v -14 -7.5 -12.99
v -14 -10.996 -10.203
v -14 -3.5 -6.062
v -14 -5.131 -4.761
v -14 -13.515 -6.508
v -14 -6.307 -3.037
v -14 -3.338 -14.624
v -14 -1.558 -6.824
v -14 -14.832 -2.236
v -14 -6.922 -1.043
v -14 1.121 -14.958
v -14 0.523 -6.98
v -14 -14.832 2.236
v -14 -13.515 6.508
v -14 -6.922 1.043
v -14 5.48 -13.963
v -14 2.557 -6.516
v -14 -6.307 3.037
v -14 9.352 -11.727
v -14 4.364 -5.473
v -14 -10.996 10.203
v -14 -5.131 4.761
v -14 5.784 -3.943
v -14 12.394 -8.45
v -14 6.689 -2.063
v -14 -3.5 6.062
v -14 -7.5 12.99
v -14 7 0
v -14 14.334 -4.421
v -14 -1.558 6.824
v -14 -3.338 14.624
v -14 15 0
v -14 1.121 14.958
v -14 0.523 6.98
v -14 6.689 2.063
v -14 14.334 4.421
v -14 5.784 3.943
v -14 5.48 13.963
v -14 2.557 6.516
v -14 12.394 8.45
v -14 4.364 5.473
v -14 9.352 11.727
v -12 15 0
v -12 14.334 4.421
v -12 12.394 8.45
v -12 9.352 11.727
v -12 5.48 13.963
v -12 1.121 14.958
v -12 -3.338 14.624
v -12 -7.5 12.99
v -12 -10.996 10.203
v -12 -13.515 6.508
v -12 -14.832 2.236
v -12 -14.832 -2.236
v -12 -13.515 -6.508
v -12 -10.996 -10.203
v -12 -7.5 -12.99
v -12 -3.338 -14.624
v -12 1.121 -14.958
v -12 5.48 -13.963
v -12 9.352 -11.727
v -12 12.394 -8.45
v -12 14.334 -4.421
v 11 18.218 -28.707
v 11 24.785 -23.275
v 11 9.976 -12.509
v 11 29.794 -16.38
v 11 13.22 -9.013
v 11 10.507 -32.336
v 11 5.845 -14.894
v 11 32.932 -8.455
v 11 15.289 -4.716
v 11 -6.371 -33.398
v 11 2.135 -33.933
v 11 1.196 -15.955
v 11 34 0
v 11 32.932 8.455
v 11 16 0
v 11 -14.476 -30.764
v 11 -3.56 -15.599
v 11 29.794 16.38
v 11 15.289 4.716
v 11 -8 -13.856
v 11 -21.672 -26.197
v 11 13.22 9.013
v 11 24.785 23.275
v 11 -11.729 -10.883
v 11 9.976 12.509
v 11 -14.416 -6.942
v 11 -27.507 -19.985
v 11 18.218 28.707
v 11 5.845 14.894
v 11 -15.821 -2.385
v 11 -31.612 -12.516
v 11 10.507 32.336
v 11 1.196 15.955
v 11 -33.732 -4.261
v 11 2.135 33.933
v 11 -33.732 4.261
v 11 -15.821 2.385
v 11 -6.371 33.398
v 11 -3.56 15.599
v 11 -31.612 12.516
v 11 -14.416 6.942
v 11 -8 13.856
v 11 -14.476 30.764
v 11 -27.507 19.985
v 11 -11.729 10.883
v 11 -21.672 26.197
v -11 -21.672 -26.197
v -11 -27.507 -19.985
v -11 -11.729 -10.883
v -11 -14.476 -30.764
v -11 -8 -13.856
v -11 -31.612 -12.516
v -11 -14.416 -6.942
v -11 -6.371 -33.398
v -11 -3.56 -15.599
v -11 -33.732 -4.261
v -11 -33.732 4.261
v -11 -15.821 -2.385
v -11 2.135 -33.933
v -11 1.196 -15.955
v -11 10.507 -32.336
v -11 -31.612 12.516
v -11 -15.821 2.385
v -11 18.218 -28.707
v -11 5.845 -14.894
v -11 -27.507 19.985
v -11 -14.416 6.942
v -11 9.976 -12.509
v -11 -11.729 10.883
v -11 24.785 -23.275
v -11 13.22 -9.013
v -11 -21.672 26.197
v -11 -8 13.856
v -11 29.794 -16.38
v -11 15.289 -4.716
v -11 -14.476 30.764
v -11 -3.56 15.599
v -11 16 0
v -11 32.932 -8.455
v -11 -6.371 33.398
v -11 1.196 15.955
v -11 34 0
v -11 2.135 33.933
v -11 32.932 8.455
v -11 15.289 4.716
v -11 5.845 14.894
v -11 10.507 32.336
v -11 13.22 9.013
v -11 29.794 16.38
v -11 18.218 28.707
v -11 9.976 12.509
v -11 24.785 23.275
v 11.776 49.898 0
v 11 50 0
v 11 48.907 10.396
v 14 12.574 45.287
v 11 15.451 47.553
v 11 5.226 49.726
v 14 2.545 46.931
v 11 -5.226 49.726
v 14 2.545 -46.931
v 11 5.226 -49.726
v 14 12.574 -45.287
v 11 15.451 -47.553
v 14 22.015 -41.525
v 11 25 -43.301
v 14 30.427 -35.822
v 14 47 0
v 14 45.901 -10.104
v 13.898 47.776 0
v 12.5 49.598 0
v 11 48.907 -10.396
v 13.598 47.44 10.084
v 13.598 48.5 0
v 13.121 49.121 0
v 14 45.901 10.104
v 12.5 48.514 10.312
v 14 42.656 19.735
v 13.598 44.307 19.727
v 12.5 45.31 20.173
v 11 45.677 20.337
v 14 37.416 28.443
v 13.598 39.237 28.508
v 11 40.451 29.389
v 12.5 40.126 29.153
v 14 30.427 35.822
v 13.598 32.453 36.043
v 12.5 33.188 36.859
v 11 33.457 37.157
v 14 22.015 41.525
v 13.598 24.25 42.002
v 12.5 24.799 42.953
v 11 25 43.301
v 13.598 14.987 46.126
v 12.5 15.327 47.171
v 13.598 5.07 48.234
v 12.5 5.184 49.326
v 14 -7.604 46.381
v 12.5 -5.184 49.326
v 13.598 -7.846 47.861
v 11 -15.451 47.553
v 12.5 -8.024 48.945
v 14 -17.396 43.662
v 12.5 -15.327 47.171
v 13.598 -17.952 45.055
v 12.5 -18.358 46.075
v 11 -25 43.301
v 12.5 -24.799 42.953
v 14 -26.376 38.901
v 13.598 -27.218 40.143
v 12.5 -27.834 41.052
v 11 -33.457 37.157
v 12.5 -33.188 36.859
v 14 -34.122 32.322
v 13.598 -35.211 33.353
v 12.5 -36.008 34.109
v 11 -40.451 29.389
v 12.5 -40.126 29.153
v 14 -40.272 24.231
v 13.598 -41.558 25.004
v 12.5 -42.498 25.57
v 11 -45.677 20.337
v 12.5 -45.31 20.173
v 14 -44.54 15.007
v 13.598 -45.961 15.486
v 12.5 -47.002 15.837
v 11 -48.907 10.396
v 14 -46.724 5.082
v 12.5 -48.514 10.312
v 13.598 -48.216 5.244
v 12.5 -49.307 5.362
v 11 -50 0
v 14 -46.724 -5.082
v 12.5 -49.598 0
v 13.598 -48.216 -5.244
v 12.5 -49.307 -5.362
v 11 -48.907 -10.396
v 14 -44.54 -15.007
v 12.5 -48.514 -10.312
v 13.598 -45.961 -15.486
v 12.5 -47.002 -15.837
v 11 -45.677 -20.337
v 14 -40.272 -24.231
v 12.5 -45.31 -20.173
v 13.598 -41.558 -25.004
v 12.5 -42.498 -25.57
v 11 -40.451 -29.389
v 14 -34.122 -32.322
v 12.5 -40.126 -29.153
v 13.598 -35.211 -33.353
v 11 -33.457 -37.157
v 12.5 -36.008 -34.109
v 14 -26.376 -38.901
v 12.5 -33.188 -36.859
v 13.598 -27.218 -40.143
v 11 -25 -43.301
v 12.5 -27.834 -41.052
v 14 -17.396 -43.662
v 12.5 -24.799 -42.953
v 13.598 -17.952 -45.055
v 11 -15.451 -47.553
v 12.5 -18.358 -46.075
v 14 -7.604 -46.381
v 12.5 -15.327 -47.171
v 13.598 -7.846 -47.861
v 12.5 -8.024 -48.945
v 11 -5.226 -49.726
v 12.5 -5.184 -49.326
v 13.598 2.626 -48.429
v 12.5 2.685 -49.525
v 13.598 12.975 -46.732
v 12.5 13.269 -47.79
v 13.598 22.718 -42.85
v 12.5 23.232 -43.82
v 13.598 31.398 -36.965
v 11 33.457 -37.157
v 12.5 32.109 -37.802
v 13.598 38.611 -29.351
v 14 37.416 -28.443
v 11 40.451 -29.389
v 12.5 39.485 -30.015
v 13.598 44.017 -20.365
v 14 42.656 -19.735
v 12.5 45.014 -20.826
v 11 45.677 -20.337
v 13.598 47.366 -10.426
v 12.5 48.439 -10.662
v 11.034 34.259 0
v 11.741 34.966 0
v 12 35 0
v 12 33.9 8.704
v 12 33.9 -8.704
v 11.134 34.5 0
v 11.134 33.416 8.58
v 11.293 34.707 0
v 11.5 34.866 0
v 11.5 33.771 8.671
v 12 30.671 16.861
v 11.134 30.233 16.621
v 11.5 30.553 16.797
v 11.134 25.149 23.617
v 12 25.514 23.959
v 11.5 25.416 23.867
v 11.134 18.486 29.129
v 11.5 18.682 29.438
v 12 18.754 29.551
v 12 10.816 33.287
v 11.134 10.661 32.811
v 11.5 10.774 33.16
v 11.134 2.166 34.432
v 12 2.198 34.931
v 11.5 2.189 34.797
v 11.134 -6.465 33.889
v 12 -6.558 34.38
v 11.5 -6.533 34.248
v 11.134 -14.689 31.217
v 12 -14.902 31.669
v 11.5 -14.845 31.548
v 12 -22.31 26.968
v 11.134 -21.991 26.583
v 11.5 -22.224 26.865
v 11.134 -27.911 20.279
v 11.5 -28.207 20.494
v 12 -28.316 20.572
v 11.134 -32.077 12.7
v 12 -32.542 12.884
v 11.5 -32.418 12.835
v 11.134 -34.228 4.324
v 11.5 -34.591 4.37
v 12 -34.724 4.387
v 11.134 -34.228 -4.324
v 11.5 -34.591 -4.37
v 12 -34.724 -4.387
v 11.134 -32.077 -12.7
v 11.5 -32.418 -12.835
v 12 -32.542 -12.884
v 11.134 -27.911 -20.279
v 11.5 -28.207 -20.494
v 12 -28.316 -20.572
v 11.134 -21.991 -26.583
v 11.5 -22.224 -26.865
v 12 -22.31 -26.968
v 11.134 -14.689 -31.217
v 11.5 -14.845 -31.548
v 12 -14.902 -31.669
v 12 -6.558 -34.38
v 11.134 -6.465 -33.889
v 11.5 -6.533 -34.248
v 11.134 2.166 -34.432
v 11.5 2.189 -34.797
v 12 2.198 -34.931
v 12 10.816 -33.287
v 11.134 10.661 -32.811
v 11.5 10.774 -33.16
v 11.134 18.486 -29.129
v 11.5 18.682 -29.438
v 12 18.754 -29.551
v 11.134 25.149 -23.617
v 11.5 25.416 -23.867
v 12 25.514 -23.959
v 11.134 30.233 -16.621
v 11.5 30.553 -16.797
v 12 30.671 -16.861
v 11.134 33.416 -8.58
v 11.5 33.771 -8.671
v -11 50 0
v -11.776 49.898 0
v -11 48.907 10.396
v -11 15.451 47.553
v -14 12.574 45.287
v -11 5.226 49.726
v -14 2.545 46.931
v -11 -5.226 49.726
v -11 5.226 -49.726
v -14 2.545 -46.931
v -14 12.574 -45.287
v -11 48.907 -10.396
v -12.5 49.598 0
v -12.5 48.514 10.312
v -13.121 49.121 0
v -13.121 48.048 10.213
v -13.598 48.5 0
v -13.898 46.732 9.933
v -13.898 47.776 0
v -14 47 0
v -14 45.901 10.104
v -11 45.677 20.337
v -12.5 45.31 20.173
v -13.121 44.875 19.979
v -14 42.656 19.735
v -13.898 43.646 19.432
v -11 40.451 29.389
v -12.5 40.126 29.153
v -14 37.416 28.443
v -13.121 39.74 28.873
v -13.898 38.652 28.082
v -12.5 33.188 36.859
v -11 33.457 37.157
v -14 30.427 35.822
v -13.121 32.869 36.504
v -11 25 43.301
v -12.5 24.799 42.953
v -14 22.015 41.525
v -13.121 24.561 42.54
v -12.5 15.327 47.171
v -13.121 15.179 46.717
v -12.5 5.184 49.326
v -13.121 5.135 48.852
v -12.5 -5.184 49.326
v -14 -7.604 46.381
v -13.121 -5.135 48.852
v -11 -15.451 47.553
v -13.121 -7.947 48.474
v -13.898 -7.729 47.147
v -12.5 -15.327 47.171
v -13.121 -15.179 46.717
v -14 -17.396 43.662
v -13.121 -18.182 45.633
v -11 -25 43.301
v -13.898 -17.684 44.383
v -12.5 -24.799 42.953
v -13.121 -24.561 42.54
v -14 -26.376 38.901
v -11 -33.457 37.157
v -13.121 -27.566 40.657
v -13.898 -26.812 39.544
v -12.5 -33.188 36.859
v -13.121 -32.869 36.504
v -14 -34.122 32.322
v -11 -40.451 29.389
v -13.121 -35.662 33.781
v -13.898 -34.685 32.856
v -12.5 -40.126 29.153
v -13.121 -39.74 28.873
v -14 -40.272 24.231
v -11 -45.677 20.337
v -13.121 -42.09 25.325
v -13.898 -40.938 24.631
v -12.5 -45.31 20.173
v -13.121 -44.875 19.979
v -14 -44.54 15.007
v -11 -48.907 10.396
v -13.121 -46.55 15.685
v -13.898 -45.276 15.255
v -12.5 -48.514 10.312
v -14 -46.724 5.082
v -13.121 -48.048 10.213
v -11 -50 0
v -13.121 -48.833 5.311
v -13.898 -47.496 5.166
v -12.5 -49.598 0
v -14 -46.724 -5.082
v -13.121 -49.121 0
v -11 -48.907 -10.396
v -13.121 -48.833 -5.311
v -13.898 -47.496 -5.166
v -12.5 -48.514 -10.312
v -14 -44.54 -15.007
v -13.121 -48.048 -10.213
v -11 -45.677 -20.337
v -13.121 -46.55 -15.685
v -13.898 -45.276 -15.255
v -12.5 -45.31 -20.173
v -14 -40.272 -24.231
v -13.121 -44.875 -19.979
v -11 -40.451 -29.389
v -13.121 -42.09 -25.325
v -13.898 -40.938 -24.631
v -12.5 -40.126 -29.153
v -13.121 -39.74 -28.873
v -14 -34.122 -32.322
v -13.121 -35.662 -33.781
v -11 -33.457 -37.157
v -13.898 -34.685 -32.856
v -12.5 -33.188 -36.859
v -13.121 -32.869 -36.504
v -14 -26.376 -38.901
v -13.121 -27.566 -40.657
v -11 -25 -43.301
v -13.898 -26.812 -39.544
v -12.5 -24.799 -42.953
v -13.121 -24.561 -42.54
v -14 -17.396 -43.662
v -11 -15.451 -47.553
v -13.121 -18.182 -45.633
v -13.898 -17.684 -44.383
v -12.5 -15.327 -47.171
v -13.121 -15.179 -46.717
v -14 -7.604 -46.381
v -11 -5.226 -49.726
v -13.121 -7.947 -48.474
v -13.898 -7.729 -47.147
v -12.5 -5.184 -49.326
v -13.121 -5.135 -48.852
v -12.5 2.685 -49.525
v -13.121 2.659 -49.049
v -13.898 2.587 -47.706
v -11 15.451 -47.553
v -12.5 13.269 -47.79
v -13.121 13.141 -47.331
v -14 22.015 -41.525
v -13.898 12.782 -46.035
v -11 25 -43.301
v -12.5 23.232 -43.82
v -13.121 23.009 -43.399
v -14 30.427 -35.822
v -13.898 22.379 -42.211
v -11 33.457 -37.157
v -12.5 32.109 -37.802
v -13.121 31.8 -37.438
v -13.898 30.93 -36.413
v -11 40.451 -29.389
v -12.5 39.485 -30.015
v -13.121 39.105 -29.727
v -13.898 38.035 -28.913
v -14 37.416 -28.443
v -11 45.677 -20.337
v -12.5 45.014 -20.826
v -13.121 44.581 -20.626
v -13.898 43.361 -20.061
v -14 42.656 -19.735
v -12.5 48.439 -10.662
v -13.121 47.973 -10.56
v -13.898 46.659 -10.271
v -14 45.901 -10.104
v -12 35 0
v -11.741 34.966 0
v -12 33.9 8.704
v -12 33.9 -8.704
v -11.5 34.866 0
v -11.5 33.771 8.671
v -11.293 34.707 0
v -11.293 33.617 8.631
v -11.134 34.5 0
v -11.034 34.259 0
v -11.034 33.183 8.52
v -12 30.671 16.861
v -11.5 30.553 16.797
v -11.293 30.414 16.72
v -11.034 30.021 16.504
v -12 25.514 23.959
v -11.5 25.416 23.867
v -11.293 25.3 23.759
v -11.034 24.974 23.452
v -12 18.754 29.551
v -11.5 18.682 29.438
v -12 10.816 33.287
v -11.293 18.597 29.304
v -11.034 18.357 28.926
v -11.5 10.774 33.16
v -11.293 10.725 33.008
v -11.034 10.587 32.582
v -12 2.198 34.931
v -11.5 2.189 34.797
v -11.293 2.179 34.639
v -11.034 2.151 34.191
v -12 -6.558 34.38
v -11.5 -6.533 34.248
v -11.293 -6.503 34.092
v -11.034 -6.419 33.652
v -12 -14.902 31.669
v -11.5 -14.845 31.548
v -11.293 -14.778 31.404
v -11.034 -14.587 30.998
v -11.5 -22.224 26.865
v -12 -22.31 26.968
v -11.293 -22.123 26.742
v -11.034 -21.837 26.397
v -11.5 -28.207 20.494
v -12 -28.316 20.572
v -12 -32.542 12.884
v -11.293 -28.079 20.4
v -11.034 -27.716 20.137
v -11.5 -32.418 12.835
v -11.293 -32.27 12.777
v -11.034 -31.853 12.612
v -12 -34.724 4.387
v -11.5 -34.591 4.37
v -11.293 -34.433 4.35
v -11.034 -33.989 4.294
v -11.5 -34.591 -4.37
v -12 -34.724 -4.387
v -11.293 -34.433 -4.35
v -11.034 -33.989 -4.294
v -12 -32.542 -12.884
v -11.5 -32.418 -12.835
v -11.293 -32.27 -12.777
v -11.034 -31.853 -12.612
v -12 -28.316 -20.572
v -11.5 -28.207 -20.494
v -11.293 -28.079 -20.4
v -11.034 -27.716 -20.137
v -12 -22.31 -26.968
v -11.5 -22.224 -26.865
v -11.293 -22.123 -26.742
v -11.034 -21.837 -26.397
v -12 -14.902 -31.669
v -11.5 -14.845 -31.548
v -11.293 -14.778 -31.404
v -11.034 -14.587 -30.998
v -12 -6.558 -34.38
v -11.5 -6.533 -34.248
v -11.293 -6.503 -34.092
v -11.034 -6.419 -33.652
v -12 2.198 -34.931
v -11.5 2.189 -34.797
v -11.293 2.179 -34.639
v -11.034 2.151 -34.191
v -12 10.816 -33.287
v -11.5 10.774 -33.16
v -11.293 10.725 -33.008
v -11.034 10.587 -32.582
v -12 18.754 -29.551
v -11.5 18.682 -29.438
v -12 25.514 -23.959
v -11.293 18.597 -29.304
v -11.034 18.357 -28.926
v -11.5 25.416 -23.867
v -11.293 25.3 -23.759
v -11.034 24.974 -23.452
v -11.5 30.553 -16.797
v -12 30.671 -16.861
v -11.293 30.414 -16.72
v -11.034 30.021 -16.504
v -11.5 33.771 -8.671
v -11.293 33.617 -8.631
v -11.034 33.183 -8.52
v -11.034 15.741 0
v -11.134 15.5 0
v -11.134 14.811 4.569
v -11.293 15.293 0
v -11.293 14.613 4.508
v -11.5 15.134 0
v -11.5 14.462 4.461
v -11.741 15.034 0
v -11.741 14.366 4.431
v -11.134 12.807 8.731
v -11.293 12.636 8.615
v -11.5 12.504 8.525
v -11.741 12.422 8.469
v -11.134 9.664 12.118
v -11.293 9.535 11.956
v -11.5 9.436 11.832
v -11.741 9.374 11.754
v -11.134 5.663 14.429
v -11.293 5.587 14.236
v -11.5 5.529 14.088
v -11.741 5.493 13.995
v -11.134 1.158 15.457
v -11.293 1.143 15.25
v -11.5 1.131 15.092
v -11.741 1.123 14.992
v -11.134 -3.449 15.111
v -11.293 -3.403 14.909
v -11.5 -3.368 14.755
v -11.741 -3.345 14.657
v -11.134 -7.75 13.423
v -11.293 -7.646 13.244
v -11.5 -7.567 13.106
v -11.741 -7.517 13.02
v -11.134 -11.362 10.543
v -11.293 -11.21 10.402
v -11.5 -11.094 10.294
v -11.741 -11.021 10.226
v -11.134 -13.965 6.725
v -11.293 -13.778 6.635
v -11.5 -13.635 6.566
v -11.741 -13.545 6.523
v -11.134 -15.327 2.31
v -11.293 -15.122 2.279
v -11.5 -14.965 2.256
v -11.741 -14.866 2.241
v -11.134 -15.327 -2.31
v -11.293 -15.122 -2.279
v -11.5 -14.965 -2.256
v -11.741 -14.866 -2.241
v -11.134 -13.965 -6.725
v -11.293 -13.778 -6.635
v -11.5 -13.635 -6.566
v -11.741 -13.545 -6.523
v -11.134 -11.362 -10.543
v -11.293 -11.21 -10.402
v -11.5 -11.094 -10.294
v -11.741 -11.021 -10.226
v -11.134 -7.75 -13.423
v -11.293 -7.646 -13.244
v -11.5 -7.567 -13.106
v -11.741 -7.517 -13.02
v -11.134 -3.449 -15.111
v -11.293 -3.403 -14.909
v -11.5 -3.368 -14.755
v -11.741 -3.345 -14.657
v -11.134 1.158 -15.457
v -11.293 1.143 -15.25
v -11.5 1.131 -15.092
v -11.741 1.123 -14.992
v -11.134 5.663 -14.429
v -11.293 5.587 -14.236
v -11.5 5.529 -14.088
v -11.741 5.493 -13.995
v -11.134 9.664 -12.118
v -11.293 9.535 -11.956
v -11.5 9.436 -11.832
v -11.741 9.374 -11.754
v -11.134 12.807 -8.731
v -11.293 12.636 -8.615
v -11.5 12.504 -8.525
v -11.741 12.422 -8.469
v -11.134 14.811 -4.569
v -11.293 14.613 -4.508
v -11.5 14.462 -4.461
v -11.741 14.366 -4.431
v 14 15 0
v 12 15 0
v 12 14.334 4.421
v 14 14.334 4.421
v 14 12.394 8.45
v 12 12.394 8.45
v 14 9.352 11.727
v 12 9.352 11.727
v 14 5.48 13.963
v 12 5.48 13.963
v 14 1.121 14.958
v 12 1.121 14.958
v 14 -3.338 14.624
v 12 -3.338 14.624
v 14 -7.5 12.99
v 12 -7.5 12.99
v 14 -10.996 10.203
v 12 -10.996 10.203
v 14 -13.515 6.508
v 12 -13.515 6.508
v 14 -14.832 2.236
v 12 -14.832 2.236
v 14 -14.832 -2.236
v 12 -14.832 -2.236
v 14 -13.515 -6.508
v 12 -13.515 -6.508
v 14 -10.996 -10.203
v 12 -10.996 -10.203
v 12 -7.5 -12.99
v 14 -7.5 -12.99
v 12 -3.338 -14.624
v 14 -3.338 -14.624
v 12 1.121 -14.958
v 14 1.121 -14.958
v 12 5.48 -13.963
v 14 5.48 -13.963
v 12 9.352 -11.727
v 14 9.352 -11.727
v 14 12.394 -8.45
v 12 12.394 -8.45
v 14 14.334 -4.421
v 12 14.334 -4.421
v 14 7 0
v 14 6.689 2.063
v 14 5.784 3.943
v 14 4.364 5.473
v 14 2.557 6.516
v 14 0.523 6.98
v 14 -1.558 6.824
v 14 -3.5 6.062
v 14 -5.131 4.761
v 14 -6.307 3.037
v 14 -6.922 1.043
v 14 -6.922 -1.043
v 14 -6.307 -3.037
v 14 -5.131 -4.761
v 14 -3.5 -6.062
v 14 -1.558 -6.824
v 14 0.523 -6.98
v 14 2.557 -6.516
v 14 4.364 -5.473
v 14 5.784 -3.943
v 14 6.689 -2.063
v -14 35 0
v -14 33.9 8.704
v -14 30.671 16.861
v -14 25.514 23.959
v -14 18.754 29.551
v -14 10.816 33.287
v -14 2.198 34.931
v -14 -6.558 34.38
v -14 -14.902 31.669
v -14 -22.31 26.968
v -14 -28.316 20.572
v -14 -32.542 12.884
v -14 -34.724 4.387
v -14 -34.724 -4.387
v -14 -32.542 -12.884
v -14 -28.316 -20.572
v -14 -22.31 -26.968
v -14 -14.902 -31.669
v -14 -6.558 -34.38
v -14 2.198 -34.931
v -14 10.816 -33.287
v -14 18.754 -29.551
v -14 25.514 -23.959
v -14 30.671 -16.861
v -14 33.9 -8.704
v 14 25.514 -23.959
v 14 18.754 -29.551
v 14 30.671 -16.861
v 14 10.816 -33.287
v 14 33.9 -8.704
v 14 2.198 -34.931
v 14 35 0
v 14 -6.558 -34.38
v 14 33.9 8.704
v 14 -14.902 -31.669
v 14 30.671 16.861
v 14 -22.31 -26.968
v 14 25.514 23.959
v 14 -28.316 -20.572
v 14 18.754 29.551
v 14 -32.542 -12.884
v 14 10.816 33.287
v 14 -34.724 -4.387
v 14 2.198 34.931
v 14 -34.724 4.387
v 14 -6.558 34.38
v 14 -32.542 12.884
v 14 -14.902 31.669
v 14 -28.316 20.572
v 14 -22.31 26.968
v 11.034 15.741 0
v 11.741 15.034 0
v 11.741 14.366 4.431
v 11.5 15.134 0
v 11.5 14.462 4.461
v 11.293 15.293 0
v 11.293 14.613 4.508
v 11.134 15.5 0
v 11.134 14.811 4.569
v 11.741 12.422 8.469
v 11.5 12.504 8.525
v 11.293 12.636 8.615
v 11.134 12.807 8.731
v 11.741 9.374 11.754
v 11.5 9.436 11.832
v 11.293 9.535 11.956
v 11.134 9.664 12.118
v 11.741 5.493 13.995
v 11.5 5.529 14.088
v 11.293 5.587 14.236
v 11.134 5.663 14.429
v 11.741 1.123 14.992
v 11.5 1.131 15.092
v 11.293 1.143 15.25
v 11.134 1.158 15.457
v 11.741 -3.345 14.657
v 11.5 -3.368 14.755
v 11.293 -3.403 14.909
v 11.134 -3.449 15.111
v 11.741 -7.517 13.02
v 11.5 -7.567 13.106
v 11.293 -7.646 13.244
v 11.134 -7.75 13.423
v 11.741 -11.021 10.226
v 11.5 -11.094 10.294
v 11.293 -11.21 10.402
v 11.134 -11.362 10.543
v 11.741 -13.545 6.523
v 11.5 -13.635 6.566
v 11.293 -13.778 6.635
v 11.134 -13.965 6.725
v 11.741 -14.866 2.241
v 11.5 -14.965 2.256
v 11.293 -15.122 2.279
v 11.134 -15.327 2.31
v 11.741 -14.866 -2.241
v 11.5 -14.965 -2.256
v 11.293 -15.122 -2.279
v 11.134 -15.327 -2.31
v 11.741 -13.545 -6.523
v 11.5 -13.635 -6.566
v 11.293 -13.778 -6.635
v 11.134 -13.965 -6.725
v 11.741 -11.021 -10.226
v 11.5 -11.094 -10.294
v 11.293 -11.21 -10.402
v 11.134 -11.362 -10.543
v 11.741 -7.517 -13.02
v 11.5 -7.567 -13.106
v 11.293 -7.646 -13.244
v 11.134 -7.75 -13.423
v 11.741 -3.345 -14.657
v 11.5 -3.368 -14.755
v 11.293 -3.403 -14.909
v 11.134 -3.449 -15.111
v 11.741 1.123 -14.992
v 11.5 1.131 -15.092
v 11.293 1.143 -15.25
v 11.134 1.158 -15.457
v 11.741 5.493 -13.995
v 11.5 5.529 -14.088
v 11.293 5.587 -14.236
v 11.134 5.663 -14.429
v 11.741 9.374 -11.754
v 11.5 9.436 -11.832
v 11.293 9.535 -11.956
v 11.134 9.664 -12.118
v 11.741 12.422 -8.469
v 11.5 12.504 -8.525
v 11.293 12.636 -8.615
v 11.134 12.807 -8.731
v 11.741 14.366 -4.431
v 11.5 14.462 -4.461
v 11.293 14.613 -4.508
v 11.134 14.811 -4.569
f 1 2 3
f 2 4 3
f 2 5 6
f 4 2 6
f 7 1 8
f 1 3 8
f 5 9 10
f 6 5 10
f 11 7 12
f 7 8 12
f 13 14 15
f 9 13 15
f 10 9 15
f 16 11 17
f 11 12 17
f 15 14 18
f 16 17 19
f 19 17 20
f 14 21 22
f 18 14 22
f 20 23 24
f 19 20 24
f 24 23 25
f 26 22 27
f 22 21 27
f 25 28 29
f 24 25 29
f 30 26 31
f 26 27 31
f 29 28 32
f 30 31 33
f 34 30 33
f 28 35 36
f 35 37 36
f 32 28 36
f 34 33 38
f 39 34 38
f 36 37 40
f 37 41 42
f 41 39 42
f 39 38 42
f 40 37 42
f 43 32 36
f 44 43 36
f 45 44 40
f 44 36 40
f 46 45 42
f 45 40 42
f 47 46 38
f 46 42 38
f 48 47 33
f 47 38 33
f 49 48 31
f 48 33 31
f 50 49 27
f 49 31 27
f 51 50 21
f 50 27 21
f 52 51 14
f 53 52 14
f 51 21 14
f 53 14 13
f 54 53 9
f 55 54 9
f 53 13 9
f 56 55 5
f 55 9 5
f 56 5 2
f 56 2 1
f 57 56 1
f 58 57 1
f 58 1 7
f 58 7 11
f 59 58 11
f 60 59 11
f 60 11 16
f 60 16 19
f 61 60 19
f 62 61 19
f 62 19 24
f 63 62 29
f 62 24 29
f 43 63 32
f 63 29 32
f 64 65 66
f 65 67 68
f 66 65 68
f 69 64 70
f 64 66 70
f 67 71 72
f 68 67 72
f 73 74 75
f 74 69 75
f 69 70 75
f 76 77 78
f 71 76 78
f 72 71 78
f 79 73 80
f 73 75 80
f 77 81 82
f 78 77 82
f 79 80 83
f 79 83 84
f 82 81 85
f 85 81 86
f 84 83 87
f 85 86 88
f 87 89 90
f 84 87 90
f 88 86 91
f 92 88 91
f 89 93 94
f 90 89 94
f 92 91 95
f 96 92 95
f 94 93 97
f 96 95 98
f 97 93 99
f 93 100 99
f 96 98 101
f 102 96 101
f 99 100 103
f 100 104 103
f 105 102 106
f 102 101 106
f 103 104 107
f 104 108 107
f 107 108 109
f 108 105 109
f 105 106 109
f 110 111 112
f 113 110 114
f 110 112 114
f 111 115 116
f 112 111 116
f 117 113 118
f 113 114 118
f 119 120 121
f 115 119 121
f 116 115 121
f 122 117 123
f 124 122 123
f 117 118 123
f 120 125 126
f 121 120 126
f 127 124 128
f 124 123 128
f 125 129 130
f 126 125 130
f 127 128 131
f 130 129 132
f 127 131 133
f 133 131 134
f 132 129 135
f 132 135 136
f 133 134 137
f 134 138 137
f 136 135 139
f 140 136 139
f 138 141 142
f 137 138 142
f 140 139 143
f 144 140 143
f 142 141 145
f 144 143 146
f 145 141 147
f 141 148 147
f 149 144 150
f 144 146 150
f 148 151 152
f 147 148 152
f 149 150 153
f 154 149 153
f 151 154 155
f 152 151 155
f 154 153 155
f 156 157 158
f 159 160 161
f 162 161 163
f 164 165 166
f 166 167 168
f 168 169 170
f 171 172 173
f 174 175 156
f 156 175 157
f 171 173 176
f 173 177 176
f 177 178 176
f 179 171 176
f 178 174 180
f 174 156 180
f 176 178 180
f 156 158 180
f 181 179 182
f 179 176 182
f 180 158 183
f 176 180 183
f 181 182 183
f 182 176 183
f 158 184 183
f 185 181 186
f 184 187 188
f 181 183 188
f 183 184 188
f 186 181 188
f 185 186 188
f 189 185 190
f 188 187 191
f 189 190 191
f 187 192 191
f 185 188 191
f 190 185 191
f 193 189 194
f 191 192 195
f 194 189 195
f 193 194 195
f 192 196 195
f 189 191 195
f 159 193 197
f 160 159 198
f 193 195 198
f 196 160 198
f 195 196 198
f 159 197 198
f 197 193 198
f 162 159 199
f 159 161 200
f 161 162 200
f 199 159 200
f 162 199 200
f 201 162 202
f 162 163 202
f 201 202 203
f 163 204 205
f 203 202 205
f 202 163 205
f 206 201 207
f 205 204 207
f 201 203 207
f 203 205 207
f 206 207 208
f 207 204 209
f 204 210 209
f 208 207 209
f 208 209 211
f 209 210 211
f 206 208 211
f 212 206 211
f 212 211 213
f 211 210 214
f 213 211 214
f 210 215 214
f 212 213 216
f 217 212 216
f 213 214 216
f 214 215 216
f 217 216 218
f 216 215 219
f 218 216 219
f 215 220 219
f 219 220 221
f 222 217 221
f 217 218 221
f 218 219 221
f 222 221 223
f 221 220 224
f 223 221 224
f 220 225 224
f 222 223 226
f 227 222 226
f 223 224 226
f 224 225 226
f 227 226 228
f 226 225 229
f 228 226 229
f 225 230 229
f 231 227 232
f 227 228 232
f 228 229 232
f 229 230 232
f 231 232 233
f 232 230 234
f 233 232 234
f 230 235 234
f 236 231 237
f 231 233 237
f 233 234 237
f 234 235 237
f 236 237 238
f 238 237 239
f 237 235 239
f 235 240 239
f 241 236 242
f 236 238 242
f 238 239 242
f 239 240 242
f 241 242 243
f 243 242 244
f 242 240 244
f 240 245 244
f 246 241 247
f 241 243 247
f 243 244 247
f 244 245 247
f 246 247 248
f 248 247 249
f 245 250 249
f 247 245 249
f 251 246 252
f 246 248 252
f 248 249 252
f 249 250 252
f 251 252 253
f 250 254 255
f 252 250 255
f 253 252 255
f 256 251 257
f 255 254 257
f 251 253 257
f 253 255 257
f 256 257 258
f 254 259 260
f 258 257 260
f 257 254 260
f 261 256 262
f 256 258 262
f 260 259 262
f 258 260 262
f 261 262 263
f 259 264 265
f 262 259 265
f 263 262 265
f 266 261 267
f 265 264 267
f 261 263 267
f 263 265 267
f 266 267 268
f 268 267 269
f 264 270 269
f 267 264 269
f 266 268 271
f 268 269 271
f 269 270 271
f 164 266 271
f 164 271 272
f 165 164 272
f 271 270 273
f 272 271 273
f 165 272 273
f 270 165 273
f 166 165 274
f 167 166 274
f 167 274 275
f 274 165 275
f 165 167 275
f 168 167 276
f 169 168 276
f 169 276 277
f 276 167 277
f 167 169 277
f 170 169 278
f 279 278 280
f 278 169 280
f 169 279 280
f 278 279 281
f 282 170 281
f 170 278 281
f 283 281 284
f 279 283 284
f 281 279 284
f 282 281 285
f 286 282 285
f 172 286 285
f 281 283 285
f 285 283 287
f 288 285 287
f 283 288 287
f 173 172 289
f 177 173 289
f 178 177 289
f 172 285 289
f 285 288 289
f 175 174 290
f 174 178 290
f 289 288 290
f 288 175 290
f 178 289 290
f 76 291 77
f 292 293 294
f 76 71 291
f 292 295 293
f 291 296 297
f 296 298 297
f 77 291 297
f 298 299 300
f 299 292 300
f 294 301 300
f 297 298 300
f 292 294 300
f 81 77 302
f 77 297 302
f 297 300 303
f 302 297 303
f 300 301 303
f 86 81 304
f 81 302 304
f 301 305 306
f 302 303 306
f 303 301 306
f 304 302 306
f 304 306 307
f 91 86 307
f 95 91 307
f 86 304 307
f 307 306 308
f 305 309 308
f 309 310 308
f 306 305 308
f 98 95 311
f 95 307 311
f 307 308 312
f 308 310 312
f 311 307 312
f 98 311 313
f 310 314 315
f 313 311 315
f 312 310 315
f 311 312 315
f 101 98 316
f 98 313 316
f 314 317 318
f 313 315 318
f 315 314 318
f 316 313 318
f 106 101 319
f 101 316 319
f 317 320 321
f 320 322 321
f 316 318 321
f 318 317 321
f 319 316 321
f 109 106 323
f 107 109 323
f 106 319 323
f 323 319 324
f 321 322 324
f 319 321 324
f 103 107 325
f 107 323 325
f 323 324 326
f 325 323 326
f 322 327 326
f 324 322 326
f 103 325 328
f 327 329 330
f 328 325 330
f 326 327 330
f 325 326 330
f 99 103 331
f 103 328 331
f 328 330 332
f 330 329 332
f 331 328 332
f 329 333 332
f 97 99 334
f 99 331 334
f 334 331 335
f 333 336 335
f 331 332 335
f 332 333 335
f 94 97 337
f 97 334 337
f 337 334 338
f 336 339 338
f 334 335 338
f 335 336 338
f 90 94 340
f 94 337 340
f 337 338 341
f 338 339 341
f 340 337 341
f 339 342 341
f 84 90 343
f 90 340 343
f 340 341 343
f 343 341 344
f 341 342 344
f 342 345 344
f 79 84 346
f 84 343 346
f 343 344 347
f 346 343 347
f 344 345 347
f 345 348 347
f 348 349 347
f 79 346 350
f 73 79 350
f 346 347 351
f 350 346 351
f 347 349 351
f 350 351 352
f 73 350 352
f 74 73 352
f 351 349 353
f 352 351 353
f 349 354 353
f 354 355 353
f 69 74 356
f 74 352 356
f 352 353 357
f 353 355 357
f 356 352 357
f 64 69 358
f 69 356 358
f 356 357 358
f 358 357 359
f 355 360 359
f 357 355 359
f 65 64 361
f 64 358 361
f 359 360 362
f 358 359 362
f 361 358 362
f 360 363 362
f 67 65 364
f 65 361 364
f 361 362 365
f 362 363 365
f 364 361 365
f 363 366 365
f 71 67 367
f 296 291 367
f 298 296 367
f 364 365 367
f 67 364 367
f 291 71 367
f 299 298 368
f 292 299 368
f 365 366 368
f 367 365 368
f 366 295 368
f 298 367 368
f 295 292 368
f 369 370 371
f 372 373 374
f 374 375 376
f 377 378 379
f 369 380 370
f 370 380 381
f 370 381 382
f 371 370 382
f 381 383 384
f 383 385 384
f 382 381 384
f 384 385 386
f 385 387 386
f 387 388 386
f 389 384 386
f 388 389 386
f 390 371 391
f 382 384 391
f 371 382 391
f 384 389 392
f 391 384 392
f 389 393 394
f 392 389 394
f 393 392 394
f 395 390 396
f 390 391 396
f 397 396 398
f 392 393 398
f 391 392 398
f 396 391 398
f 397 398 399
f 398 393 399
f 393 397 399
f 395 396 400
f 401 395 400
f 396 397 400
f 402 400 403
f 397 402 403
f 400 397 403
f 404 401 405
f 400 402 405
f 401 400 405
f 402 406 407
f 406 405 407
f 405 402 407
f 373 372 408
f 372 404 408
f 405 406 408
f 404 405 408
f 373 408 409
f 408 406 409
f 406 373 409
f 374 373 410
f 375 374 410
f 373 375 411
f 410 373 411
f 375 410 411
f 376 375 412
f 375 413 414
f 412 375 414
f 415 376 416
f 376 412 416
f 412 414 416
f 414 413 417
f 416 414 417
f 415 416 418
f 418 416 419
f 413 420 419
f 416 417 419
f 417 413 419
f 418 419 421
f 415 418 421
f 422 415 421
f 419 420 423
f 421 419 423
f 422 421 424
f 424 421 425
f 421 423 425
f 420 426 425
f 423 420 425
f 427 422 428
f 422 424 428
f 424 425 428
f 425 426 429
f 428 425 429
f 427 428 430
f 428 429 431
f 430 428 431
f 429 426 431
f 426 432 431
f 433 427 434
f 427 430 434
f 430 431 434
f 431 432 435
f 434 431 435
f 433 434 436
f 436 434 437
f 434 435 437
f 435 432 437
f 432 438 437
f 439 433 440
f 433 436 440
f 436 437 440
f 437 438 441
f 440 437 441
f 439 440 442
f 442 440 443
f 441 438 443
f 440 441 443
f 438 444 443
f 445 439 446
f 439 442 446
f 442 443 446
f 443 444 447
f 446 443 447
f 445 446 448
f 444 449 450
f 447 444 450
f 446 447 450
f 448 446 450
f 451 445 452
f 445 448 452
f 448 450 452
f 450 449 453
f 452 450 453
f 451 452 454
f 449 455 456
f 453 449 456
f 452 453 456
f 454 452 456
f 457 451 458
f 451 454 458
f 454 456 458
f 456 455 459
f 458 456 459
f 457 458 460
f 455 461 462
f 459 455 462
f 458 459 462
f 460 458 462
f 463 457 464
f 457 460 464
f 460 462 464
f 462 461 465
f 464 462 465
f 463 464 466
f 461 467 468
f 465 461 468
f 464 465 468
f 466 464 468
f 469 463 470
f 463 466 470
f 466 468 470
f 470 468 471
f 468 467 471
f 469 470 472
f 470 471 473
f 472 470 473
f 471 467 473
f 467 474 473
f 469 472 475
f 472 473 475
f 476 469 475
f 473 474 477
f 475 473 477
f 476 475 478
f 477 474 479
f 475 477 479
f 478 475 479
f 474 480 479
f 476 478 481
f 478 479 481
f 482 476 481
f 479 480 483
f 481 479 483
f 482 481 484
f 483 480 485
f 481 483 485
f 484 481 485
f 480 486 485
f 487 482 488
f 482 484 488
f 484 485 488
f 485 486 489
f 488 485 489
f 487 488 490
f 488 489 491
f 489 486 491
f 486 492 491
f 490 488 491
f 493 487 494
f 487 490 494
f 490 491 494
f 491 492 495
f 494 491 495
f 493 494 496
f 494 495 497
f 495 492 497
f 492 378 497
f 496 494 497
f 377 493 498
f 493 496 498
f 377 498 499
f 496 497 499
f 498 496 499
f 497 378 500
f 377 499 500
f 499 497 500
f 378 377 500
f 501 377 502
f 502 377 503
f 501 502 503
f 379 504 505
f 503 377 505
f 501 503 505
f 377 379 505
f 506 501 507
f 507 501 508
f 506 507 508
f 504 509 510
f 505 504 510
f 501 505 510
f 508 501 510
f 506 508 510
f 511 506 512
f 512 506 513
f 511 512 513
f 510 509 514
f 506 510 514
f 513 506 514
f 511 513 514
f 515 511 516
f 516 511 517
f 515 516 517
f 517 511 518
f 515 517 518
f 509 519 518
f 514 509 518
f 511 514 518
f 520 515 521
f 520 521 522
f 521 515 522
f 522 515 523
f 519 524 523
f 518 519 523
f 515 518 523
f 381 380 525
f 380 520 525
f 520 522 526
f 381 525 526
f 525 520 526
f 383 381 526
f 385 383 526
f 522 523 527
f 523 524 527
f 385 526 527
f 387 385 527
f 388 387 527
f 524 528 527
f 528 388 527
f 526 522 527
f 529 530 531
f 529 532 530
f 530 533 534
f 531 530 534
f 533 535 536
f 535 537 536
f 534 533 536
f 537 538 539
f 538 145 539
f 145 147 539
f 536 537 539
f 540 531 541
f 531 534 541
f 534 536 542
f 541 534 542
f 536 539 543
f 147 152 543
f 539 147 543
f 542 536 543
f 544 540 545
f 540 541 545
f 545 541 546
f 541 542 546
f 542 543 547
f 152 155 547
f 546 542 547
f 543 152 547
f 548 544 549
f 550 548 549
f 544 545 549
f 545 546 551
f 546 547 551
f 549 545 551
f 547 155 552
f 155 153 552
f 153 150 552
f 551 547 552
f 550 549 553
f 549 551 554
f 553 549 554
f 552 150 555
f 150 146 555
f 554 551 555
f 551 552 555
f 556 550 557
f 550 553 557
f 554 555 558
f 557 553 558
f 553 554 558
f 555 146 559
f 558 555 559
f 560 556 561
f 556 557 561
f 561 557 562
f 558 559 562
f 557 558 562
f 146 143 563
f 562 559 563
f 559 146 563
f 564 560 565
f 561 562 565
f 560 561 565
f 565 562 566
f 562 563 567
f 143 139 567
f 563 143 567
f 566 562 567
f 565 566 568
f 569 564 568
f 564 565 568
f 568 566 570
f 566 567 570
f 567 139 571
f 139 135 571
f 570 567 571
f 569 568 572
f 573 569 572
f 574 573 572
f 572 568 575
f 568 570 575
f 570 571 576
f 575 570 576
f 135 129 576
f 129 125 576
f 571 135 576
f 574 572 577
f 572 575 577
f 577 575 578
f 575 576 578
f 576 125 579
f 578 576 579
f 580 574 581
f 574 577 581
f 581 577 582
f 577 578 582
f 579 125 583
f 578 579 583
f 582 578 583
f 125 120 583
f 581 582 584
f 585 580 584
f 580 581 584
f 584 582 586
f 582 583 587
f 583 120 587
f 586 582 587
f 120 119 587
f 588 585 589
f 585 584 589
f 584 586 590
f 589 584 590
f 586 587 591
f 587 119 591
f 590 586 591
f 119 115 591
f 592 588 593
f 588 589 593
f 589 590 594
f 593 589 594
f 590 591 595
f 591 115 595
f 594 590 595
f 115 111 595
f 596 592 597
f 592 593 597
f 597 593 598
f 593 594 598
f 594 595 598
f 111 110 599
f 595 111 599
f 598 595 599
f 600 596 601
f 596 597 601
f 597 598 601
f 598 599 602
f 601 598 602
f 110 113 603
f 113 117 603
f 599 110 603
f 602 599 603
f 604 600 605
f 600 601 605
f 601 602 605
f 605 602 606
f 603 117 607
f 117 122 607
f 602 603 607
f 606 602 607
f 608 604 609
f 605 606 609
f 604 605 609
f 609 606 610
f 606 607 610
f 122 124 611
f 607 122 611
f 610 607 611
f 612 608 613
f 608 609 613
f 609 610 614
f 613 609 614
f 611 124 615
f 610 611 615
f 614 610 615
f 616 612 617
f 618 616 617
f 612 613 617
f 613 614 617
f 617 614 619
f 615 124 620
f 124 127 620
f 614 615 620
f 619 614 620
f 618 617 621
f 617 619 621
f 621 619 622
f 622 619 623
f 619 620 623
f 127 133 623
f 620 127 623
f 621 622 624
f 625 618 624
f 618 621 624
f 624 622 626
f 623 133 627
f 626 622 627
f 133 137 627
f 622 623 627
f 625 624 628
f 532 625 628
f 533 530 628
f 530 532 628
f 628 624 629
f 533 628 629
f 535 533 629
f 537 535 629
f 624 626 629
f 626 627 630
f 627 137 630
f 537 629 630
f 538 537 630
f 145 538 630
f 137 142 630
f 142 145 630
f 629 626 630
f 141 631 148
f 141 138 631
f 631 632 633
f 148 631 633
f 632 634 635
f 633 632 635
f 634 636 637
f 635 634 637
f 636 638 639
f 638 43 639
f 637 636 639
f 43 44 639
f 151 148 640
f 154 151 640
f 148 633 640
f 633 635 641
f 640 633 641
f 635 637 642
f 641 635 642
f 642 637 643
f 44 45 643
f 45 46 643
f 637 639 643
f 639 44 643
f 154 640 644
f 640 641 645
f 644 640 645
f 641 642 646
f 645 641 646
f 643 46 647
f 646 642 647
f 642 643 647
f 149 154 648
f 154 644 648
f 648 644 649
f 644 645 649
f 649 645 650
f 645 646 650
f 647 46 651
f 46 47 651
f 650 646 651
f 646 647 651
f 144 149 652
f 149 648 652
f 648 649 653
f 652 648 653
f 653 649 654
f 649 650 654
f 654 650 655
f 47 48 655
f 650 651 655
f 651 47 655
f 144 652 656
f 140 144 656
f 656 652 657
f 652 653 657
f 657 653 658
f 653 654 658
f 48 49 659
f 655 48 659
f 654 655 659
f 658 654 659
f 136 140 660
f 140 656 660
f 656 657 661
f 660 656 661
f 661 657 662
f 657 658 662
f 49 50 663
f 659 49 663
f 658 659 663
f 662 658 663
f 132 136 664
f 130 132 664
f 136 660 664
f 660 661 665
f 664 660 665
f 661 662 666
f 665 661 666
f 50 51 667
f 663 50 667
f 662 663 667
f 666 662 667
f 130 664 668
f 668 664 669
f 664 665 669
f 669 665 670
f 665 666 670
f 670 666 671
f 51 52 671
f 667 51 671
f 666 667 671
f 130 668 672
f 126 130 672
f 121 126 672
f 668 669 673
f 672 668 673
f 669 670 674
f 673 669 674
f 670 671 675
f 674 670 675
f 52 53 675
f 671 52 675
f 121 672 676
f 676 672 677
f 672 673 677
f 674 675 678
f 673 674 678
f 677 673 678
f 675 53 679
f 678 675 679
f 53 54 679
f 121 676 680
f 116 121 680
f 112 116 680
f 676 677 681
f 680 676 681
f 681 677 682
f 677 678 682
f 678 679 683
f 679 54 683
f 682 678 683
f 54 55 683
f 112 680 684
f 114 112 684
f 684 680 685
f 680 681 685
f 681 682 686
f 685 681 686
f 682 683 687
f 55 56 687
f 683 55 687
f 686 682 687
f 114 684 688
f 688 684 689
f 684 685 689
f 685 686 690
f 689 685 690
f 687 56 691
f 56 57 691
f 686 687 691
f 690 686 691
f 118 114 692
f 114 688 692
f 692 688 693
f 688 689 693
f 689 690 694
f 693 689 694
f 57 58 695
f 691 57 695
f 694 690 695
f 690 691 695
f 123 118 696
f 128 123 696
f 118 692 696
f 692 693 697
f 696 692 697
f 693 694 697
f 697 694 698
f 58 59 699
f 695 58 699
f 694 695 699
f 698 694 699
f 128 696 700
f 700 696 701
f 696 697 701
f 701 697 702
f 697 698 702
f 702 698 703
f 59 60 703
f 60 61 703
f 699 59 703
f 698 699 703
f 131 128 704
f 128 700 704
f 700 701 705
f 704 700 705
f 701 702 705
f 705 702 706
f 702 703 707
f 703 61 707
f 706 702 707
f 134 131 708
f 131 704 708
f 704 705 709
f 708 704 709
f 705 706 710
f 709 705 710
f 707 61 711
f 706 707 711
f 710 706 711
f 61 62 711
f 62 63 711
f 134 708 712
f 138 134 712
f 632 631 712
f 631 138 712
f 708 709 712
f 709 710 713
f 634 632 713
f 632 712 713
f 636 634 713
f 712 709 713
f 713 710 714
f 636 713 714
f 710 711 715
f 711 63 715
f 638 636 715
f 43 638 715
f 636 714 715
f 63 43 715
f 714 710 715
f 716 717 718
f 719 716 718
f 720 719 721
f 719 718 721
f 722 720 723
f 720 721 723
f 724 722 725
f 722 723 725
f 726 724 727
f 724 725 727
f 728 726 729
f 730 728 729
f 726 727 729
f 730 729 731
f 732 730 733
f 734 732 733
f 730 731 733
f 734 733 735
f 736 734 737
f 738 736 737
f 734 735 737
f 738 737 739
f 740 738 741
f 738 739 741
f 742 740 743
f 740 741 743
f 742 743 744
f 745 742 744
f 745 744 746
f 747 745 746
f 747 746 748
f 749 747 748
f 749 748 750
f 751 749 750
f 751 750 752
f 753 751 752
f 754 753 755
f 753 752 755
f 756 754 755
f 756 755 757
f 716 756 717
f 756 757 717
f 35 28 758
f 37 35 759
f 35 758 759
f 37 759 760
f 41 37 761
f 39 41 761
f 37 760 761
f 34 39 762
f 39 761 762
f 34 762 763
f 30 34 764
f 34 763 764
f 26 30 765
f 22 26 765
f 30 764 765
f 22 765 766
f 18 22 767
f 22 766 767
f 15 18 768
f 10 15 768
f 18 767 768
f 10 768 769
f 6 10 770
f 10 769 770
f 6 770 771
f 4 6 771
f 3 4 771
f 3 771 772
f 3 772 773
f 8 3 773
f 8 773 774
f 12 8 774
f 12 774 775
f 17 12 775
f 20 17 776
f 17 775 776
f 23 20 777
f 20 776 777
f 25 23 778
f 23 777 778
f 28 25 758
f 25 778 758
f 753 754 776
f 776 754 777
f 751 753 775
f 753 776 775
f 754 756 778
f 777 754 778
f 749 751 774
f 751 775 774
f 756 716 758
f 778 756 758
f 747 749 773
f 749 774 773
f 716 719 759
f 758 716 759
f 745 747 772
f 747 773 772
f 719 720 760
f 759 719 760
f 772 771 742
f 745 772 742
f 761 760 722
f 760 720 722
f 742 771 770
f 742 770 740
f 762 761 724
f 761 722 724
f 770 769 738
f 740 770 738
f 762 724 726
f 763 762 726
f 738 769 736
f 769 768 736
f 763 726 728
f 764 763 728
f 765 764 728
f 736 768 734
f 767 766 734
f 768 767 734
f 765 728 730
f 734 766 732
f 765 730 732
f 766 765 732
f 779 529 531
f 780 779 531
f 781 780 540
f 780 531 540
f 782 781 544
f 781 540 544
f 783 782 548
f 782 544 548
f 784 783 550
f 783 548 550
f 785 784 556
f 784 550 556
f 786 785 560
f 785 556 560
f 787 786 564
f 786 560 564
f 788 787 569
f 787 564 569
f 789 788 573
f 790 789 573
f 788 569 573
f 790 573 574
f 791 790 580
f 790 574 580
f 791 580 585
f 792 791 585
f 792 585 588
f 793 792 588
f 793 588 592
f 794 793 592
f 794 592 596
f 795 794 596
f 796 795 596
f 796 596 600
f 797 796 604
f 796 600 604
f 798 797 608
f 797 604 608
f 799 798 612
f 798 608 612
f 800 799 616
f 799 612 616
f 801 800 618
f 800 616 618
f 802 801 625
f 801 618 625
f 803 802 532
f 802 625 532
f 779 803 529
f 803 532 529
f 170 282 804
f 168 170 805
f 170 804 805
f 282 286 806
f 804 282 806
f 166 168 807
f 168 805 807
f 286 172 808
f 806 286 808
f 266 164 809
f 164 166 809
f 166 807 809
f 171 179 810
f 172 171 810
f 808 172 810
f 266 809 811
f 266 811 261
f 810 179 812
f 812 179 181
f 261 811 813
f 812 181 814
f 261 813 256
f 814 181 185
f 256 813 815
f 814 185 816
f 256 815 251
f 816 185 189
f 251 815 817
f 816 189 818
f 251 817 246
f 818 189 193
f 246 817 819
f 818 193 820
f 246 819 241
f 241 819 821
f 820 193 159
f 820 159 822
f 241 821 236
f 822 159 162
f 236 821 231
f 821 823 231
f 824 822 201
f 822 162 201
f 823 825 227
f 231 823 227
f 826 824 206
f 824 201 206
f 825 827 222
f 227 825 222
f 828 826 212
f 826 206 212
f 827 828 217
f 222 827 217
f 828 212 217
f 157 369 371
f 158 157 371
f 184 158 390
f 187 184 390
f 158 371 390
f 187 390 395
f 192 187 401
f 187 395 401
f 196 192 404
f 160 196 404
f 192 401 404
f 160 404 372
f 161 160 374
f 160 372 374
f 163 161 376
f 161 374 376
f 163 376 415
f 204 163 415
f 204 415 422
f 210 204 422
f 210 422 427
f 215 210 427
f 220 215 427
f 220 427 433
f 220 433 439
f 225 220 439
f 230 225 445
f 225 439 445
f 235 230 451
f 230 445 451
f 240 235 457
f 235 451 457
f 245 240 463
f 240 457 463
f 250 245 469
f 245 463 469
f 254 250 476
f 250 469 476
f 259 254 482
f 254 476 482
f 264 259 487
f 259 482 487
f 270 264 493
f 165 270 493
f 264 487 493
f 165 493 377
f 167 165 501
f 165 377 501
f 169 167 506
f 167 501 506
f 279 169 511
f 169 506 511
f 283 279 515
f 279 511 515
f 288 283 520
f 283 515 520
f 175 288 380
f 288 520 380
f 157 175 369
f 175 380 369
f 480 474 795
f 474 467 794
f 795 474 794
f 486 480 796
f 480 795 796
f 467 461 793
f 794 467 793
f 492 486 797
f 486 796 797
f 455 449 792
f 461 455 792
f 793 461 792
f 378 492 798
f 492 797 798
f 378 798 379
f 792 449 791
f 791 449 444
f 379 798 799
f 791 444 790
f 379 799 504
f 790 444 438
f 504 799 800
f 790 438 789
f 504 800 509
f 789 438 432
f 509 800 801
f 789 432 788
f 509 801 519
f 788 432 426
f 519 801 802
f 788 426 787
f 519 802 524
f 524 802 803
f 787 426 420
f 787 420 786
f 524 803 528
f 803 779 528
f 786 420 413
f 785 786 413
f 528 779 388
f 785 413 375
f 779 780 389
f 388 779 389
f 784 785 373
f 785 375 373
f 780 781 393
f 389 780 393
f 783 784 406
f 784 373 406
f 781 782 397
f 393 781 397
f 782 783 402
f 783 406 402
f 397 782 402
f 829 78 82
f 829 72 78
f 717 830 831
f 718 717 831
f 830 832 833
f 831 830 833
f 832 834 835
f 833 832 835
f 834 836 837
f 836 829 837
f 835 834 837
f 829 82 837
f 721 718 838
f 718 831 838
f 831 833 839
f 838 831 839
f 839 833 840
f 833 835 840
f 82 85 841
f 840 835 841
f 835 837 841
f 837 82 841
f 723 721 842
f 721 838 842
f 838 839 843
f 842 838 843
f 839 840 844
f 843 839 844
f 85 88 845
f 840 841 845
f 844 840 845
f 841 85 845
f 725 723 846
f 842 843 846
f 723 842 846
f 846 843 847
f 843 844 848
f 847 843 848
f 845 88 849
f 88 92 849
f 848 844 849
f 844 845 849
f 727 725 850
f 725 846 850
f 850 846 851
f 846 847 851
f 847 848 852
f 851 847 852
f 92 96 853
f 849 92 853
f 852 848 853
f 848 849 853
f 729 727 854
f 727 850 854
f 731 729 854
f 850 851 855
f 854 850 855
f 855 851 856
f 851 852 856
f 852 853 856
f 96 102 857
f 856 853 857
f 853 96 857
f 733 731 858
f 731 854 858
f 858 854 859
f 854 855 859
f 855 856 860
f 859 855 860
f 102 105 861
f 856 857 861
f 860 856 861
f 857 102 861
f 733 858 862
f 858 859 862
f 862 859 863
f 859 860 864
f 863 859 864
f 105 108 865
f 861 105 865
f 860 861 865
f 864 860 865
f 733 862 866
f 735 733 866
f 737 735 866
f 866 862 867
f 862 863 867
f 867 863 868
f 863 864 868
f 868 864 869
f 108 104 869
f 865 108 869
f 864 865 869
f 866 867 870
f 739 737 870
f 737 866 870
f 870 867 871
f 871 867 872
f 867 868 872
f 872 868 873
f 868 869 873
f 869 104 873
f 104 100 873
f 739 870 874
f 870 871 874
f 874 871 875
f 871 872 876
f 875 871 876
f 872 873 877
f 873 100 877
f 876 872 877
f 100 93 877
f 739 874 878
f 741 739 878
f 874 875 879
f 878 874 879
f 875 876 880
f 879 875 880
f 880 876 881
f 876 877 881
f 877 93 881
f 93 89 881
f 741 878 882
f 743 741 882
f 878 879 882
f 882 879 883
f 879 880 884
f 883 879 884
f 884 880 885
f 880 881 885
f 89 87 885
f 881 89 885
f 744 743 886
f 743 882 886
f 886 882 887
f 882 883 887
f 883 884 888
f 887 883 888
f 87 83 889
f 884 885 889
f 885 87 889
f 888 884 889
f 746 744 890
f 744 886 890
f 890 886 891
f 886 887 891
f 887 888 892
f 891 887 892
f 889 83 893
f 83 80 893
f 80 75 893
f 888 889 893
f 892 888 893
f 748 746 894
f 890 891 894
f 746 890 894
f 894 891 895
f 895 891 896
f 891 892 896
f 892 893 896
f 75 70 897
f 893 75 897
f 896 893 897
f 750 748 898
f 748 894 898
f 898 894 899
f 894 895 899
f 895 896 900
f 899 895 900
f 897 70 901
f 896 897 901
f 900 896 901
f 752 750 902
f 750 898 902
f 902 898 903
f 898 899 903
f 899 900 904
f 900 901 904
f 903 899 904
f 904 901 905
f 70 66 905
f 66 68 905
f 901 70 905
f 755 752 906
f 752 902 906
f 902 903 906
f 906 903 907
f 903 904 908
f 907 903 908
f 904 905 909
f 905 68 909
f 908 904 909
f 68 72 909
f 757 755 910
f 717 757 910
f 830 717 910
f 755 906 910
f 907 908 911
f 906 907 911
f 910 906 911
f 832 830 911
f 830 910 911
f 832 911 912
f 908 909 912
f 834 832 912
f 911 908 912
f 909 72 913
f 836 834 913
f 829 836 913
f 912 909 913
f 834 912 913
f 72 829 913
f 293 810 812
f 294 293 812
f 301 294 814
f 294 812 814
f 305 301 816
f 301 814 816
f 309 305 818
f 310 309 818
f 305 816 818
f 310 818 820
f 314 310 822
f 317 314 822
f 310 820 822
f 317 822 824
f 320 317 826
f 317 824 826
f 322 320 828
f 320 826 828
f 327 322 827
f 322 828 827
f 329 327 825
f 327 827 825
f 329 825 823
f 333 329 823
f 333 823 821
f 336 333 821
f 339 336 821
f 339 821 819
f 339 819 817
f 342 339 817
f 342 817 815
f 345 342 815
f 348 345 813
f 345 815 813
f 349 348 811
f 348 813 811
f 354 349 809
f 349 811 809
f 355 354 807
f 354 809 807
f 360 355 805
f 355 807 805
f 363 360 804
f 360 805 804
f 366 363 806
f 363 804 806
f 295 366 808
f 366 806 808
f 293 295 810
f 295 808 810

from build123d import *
from OCP.BRepFilletAPI import BRepFilletAPI_MakeFillet

# Parameters (mm, degrees)
REDONDEO1_R1 = 1
REDONDEO1_R2 = 3


with BuildPart() as part:
    # Croquis1 → Revolución2 (revolve)
    with BuildSketch(Plane.XY):
        Polygon((-14, 7), (14, 7), (14, 15), (11, 15), (11, 35), (14, 35), (14, 50), (-14, 50), (-14, 35), (-11, 35), (-11, 15), (-14, 15), align=None)
    revolve(axis=Axis((-38.038468992, 0, 0), (1, 0, 0)))

    # Redondeo1: one fillet with a radius per group of edges: ONE call of the kernel's fillet builder (fillet() takes one radius for all edges)
    redondeo1_edges_1 = [part.edges().sort_by_distance(p)[0] for p in [
        (11, -15, 0),
        (11, -35, 0),
        (-11, -35, 0),
        (-11, -15, 0),
    ]]
    redondeo1_edges_2 = [part.edges().sort_by_distance(p)[0] for p in [
        (14, -50, 0),
        (-14, -50, 0),
    ]]
    redondeo1 = BRepFilletAPI_MakeFillet(part.part.solid().wrapped)
    for e in redondeo1_edges_1:
        redondeo1.Add(REDONDEO1_R1, e.wrapped)
    for e in redondeo1_edges_2:
        redondeo1.Add(REDONDEO1_R2, e.wrapped)
    add(Compound.cast(redondeo1.Shape()), mode=Mode.REPLACE)


solid = part.part
